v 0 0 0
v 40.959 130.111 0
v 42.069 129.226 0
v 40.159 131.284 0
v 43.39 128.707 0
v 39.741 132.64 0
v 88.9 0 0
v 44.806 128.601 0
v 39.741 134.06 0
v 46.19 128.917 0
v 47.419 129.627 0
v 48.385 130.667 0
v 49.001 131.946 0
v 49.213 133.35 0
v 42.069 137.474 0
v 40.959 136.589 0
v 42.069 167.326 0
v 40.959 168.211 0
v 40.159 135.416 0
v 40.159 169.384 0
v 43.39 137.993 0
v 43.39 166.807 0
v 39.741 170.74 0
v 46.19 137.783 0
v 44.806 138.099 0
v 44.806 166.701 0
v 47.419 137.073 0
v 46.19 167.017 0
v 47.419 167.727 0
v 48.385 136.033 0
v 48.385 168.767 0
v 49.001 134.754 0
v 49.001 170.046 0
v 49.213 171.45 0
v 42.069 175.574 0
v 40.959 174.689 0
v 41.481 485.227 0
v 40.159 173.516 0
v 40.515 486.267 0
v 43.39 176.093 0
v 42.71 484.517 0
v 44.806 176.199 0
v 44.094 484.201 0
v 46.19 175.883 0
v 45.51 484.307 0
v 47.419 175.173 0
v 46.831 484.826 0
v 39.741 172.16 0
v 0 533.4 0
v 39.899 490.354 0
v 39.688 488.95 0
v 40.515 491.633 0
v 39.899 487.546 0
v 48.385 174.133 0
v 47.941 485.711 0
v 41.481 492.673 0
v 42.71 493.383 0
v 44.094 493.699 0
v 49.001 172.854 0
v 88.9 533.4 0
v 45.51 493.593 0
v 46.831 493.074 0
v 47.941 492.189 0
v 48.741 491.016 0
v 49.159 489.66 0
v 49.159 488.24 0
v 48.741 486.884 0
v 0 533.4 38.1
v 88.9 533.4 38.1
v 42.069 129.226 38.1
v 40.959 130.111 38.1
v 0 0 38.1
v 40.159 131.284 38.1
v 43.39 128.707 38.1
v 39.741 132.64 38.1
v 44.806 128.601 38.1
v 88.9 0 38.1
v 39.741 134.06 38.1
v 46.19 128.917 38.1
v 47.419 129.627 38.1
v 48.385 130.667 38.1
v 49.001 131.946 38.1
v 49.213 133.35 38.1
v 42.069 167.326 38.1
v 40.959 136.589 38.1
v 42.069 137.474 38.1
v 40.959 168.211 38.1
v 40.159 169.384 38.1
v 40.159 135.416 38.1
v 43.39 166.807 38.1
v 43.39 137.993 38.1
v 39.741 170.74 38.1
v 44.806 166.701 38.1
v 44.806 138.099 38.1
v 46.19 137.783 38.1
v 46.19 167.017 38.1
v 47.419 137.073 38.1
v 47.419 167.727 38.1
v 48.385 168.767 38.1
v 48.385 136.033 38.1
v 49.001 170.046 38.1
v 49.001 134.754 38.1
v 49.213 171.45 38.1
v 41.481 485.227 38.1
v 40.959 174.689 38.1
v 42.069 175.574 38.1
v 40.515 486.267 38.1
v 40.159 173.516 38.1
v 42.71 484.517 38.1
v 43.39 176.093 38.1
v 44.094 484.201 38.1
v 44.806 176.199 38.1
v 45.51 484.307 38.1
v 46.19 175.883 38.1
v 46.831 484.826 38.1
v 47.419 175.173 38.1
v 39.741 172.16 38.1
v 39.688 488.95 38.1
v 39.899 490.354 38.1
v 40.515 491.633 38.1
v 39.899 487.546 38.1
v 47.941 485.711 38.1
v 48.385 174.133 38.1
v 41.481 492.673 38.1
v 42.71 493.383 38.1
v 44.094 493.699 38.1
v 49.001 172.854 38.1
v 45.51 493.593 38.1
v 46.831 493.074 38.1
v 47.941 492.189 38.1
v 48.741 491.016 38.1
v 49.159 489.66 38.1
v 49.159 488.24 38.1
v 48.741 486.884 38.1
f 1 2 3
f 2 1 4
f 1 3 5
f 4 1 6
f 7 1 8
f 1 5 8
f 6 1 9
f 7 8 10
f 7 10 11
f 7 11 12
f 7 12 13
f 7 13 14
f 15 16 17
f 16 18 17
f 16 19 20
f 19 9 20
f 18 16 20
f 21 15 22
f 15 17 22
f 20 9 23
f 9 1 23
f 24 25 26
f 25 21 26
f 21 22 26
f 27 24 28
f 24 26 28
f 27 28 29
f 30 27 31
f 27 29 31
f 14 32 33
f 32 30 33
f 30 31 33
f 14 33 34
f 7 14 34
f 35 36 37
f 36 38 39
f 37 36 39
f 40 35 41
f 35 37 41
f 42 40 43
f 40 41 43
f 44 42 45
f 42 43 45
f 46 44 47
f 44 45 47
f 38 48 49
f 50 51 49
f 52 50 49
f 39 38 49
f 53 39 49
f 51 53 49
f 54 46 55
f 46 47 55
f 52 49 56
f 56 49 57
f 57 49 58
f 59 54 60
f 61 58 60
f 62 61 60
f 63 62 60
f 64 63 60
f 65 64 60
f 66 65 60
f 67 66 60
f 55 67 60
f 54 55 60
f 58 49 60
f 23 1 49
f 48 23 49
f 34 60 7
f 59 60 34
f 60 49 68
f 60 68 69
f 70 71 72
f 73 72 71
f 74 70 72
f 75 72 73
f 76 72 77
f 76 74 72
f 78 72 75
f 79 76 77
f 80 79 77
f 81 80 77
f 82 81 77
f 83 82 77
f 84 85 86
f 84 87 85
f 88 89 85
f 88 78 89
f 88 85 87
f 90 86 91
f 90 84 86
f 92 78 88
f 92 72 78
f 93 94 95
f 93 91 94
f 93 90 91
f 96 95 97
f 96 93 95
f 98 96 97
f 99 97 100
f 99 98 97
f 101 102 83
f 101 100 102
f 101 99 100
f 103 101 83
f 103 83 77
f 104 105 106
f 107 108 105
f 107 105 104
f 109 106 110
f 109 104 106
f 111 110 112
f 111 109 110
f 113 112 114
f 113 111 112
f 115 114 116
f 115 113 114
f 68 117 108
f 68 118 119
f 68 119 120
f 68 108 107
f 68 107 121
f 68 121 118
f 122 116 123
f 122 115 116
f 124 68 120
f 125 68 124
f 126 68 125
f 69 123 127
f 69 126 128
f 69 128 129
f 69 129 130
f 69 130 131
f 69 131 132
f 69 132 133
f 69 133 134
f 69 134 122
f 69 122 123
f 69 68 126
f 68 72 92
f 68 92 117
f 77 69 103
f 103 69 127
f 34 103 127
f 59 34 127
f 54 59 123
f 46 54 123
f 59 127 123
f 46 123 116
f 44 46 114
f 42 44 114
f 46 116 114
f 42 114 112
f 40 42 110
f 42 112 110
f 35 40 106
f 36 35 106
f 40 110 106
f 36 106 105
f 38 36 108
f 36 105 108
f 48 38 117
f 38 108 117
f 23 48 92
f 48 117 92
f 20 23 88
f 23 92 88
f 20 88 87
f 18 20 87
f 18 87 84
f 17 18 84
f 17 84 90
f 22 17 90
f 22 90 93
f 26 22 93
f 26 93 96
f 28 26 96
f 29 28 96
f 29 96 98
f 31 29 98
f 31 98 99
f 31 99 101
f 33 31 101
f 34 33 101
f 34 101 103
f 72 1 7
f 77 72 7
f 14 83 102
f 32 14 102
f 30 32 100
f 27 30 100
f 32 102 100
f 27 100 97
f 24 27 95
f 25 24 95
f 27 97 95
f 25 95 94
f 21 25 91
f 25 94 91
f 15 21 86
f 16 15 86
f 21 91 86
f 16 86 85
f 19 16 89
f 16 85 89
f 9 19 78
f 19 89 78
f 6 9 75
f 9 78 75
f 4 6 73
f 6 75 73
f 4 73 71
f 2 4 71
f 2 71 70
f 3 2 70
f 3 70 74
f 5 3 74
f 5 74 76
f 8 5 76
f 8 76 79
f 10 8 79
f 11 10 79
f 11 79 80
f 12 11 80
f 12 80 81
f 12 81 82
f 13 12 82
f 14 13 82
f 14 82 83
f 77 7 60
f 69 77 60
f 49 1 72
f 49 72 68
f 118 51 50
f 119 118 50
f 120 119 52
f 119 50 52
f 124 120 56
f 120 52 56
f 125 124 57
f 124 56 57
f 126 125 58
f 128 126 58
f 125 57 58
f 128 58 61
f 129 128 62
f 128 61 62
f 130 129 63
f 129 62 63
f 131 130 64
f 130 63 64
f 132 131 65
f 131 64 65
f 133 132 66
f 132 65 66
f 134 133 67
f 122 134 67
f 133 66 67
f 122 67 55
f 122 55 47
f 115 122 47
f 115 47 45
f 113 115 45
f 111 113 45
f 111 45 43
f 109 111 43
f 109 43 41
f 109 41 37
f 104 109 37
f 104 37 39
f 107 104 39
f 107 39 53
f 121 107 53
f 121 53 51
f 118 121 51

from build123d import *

# Parameters (mm, degrees)
SKETCH1_W                        = 88.9
SKETCH1_H                        = 533.4
BOSS_EXTRUDE1_DEPTH              = 38.1
F_3_8_0_375_DIAMETER_HOLE1_D     = 9.525
F_3_8_0_375_DIAMETER_HOLE1_DEPTH = 76.2
F_3_8_0_375_DIAMETER_HOLE1_TIP   = 2.861598698
SKETCH4_R                        = 4.7625
CUT_EXTRUDE1_DEPTH               = 543.098127648
SKETCH5_R                        = 4.7625
CUT_EXTRUDE2_DEPTH               = 543.098127648


with BuildPart() as part:
    # Sketch1 → Boss-Extrude1 (new body)
    with BuildSketch(Plane.XY):
        with Locations((44.45, 266.7)):
            Rectangle(SKETCH1_W, SKETCH1_H)
    extrude(amount=BOSS_EXTRUDE1_DEPTH)

    # 3/8 (0.375) Diameter Hole1
    with Locations(Plane.XY.offset(38.1)):
        with Locations((44.45, 488.95)):
            Hole(F_3_8_0_375_DIAMETER_HOLE1_D / 2, depth=F_3_8_0_375_DIAMETER_HOLE1_DEPTH)
            with Locations((0, 0, -(F_3_8_0_375_DIAMETER_HOLE1_DEPTH + F_3_8_0_375_DIAMETER_HOLE1_TIP / 2))):  # 118° drill point
                Cone(0, F_3_8_0_375_DIAMETER_HOLE1_D / 2, F_3_8_0_375_DIAMETER_HOLE1_TIP, mode=Mode.SUBTRACT)

    # Sketch4 → Cut-Extrude1 (cut, through all)
    with BuildSketch(Plane.XY.offset(38.1)):
        with Locations((44.45, 133.35)):
            Circle(SKETCH4_R)
    extrude(amount=-CUT_EXTRUDE1_DEPTH, mode=Mode.SUBTRACT)

    # Sketch5 → Cut-Extrude2 (cut, through all)
    with BuildSketch(Plane.XY.offset(38.1)):
        with Locations((44.45, 171.45)):
            Circle(SKETCH5_R)
    extrude(amount=-CUT_EXTRUDE2_DEPTH, mode=Mode.SUBTRACT)


solid = part.part
